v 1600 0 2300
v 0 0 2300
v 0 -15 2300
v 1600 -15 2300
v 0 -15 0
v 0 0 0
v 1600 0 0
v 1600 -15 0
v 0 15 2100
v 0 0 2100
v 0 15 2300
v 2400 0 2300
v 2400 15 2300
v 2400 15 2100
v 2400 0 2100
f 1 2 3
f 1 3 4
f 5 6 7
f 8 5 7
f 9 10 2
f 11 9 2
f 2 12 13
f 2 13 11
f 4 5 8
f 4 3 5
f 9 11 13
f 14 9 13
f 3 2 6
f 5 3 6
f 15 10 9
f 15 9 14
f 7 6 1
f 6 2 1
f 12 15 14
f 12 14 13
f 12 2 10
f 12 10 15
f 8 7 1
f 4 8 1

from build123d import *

# Parameters (mm, degrees)
F0_W     = 1600
F0_H     = 2100
F0_H_2   = 200
F1_DEPTH = 15
F0_W_2   = 800
F2_DEPTH = 15


with BuildPart() as f1:
    # F0 (on Front) → F1 (new body)
    with BuildSketch(Plane.XZ):
        with Locations((800, 1050)):
            Rectangle(F0_W, F0_H)
        with Locations((800, 2200)):
            Rectangle(F0_W, F0_H_2)
    extrude(amount=F1_DEPTH)


with BuildPart() as f2:
    # F0 (on Front) → F2 (new body)
    with BuildSketch(Plane.XZ):
        with Locations((800, 2200)):
            Rectangle(F0_W, F0_H_2)
        with Locations((2000, 2200)):
            Rectangle(F0_W_2, F0_H_2)
    extrude(amount=-F2_DEPTH)


solid = Compound([f1.part, f2.part])
